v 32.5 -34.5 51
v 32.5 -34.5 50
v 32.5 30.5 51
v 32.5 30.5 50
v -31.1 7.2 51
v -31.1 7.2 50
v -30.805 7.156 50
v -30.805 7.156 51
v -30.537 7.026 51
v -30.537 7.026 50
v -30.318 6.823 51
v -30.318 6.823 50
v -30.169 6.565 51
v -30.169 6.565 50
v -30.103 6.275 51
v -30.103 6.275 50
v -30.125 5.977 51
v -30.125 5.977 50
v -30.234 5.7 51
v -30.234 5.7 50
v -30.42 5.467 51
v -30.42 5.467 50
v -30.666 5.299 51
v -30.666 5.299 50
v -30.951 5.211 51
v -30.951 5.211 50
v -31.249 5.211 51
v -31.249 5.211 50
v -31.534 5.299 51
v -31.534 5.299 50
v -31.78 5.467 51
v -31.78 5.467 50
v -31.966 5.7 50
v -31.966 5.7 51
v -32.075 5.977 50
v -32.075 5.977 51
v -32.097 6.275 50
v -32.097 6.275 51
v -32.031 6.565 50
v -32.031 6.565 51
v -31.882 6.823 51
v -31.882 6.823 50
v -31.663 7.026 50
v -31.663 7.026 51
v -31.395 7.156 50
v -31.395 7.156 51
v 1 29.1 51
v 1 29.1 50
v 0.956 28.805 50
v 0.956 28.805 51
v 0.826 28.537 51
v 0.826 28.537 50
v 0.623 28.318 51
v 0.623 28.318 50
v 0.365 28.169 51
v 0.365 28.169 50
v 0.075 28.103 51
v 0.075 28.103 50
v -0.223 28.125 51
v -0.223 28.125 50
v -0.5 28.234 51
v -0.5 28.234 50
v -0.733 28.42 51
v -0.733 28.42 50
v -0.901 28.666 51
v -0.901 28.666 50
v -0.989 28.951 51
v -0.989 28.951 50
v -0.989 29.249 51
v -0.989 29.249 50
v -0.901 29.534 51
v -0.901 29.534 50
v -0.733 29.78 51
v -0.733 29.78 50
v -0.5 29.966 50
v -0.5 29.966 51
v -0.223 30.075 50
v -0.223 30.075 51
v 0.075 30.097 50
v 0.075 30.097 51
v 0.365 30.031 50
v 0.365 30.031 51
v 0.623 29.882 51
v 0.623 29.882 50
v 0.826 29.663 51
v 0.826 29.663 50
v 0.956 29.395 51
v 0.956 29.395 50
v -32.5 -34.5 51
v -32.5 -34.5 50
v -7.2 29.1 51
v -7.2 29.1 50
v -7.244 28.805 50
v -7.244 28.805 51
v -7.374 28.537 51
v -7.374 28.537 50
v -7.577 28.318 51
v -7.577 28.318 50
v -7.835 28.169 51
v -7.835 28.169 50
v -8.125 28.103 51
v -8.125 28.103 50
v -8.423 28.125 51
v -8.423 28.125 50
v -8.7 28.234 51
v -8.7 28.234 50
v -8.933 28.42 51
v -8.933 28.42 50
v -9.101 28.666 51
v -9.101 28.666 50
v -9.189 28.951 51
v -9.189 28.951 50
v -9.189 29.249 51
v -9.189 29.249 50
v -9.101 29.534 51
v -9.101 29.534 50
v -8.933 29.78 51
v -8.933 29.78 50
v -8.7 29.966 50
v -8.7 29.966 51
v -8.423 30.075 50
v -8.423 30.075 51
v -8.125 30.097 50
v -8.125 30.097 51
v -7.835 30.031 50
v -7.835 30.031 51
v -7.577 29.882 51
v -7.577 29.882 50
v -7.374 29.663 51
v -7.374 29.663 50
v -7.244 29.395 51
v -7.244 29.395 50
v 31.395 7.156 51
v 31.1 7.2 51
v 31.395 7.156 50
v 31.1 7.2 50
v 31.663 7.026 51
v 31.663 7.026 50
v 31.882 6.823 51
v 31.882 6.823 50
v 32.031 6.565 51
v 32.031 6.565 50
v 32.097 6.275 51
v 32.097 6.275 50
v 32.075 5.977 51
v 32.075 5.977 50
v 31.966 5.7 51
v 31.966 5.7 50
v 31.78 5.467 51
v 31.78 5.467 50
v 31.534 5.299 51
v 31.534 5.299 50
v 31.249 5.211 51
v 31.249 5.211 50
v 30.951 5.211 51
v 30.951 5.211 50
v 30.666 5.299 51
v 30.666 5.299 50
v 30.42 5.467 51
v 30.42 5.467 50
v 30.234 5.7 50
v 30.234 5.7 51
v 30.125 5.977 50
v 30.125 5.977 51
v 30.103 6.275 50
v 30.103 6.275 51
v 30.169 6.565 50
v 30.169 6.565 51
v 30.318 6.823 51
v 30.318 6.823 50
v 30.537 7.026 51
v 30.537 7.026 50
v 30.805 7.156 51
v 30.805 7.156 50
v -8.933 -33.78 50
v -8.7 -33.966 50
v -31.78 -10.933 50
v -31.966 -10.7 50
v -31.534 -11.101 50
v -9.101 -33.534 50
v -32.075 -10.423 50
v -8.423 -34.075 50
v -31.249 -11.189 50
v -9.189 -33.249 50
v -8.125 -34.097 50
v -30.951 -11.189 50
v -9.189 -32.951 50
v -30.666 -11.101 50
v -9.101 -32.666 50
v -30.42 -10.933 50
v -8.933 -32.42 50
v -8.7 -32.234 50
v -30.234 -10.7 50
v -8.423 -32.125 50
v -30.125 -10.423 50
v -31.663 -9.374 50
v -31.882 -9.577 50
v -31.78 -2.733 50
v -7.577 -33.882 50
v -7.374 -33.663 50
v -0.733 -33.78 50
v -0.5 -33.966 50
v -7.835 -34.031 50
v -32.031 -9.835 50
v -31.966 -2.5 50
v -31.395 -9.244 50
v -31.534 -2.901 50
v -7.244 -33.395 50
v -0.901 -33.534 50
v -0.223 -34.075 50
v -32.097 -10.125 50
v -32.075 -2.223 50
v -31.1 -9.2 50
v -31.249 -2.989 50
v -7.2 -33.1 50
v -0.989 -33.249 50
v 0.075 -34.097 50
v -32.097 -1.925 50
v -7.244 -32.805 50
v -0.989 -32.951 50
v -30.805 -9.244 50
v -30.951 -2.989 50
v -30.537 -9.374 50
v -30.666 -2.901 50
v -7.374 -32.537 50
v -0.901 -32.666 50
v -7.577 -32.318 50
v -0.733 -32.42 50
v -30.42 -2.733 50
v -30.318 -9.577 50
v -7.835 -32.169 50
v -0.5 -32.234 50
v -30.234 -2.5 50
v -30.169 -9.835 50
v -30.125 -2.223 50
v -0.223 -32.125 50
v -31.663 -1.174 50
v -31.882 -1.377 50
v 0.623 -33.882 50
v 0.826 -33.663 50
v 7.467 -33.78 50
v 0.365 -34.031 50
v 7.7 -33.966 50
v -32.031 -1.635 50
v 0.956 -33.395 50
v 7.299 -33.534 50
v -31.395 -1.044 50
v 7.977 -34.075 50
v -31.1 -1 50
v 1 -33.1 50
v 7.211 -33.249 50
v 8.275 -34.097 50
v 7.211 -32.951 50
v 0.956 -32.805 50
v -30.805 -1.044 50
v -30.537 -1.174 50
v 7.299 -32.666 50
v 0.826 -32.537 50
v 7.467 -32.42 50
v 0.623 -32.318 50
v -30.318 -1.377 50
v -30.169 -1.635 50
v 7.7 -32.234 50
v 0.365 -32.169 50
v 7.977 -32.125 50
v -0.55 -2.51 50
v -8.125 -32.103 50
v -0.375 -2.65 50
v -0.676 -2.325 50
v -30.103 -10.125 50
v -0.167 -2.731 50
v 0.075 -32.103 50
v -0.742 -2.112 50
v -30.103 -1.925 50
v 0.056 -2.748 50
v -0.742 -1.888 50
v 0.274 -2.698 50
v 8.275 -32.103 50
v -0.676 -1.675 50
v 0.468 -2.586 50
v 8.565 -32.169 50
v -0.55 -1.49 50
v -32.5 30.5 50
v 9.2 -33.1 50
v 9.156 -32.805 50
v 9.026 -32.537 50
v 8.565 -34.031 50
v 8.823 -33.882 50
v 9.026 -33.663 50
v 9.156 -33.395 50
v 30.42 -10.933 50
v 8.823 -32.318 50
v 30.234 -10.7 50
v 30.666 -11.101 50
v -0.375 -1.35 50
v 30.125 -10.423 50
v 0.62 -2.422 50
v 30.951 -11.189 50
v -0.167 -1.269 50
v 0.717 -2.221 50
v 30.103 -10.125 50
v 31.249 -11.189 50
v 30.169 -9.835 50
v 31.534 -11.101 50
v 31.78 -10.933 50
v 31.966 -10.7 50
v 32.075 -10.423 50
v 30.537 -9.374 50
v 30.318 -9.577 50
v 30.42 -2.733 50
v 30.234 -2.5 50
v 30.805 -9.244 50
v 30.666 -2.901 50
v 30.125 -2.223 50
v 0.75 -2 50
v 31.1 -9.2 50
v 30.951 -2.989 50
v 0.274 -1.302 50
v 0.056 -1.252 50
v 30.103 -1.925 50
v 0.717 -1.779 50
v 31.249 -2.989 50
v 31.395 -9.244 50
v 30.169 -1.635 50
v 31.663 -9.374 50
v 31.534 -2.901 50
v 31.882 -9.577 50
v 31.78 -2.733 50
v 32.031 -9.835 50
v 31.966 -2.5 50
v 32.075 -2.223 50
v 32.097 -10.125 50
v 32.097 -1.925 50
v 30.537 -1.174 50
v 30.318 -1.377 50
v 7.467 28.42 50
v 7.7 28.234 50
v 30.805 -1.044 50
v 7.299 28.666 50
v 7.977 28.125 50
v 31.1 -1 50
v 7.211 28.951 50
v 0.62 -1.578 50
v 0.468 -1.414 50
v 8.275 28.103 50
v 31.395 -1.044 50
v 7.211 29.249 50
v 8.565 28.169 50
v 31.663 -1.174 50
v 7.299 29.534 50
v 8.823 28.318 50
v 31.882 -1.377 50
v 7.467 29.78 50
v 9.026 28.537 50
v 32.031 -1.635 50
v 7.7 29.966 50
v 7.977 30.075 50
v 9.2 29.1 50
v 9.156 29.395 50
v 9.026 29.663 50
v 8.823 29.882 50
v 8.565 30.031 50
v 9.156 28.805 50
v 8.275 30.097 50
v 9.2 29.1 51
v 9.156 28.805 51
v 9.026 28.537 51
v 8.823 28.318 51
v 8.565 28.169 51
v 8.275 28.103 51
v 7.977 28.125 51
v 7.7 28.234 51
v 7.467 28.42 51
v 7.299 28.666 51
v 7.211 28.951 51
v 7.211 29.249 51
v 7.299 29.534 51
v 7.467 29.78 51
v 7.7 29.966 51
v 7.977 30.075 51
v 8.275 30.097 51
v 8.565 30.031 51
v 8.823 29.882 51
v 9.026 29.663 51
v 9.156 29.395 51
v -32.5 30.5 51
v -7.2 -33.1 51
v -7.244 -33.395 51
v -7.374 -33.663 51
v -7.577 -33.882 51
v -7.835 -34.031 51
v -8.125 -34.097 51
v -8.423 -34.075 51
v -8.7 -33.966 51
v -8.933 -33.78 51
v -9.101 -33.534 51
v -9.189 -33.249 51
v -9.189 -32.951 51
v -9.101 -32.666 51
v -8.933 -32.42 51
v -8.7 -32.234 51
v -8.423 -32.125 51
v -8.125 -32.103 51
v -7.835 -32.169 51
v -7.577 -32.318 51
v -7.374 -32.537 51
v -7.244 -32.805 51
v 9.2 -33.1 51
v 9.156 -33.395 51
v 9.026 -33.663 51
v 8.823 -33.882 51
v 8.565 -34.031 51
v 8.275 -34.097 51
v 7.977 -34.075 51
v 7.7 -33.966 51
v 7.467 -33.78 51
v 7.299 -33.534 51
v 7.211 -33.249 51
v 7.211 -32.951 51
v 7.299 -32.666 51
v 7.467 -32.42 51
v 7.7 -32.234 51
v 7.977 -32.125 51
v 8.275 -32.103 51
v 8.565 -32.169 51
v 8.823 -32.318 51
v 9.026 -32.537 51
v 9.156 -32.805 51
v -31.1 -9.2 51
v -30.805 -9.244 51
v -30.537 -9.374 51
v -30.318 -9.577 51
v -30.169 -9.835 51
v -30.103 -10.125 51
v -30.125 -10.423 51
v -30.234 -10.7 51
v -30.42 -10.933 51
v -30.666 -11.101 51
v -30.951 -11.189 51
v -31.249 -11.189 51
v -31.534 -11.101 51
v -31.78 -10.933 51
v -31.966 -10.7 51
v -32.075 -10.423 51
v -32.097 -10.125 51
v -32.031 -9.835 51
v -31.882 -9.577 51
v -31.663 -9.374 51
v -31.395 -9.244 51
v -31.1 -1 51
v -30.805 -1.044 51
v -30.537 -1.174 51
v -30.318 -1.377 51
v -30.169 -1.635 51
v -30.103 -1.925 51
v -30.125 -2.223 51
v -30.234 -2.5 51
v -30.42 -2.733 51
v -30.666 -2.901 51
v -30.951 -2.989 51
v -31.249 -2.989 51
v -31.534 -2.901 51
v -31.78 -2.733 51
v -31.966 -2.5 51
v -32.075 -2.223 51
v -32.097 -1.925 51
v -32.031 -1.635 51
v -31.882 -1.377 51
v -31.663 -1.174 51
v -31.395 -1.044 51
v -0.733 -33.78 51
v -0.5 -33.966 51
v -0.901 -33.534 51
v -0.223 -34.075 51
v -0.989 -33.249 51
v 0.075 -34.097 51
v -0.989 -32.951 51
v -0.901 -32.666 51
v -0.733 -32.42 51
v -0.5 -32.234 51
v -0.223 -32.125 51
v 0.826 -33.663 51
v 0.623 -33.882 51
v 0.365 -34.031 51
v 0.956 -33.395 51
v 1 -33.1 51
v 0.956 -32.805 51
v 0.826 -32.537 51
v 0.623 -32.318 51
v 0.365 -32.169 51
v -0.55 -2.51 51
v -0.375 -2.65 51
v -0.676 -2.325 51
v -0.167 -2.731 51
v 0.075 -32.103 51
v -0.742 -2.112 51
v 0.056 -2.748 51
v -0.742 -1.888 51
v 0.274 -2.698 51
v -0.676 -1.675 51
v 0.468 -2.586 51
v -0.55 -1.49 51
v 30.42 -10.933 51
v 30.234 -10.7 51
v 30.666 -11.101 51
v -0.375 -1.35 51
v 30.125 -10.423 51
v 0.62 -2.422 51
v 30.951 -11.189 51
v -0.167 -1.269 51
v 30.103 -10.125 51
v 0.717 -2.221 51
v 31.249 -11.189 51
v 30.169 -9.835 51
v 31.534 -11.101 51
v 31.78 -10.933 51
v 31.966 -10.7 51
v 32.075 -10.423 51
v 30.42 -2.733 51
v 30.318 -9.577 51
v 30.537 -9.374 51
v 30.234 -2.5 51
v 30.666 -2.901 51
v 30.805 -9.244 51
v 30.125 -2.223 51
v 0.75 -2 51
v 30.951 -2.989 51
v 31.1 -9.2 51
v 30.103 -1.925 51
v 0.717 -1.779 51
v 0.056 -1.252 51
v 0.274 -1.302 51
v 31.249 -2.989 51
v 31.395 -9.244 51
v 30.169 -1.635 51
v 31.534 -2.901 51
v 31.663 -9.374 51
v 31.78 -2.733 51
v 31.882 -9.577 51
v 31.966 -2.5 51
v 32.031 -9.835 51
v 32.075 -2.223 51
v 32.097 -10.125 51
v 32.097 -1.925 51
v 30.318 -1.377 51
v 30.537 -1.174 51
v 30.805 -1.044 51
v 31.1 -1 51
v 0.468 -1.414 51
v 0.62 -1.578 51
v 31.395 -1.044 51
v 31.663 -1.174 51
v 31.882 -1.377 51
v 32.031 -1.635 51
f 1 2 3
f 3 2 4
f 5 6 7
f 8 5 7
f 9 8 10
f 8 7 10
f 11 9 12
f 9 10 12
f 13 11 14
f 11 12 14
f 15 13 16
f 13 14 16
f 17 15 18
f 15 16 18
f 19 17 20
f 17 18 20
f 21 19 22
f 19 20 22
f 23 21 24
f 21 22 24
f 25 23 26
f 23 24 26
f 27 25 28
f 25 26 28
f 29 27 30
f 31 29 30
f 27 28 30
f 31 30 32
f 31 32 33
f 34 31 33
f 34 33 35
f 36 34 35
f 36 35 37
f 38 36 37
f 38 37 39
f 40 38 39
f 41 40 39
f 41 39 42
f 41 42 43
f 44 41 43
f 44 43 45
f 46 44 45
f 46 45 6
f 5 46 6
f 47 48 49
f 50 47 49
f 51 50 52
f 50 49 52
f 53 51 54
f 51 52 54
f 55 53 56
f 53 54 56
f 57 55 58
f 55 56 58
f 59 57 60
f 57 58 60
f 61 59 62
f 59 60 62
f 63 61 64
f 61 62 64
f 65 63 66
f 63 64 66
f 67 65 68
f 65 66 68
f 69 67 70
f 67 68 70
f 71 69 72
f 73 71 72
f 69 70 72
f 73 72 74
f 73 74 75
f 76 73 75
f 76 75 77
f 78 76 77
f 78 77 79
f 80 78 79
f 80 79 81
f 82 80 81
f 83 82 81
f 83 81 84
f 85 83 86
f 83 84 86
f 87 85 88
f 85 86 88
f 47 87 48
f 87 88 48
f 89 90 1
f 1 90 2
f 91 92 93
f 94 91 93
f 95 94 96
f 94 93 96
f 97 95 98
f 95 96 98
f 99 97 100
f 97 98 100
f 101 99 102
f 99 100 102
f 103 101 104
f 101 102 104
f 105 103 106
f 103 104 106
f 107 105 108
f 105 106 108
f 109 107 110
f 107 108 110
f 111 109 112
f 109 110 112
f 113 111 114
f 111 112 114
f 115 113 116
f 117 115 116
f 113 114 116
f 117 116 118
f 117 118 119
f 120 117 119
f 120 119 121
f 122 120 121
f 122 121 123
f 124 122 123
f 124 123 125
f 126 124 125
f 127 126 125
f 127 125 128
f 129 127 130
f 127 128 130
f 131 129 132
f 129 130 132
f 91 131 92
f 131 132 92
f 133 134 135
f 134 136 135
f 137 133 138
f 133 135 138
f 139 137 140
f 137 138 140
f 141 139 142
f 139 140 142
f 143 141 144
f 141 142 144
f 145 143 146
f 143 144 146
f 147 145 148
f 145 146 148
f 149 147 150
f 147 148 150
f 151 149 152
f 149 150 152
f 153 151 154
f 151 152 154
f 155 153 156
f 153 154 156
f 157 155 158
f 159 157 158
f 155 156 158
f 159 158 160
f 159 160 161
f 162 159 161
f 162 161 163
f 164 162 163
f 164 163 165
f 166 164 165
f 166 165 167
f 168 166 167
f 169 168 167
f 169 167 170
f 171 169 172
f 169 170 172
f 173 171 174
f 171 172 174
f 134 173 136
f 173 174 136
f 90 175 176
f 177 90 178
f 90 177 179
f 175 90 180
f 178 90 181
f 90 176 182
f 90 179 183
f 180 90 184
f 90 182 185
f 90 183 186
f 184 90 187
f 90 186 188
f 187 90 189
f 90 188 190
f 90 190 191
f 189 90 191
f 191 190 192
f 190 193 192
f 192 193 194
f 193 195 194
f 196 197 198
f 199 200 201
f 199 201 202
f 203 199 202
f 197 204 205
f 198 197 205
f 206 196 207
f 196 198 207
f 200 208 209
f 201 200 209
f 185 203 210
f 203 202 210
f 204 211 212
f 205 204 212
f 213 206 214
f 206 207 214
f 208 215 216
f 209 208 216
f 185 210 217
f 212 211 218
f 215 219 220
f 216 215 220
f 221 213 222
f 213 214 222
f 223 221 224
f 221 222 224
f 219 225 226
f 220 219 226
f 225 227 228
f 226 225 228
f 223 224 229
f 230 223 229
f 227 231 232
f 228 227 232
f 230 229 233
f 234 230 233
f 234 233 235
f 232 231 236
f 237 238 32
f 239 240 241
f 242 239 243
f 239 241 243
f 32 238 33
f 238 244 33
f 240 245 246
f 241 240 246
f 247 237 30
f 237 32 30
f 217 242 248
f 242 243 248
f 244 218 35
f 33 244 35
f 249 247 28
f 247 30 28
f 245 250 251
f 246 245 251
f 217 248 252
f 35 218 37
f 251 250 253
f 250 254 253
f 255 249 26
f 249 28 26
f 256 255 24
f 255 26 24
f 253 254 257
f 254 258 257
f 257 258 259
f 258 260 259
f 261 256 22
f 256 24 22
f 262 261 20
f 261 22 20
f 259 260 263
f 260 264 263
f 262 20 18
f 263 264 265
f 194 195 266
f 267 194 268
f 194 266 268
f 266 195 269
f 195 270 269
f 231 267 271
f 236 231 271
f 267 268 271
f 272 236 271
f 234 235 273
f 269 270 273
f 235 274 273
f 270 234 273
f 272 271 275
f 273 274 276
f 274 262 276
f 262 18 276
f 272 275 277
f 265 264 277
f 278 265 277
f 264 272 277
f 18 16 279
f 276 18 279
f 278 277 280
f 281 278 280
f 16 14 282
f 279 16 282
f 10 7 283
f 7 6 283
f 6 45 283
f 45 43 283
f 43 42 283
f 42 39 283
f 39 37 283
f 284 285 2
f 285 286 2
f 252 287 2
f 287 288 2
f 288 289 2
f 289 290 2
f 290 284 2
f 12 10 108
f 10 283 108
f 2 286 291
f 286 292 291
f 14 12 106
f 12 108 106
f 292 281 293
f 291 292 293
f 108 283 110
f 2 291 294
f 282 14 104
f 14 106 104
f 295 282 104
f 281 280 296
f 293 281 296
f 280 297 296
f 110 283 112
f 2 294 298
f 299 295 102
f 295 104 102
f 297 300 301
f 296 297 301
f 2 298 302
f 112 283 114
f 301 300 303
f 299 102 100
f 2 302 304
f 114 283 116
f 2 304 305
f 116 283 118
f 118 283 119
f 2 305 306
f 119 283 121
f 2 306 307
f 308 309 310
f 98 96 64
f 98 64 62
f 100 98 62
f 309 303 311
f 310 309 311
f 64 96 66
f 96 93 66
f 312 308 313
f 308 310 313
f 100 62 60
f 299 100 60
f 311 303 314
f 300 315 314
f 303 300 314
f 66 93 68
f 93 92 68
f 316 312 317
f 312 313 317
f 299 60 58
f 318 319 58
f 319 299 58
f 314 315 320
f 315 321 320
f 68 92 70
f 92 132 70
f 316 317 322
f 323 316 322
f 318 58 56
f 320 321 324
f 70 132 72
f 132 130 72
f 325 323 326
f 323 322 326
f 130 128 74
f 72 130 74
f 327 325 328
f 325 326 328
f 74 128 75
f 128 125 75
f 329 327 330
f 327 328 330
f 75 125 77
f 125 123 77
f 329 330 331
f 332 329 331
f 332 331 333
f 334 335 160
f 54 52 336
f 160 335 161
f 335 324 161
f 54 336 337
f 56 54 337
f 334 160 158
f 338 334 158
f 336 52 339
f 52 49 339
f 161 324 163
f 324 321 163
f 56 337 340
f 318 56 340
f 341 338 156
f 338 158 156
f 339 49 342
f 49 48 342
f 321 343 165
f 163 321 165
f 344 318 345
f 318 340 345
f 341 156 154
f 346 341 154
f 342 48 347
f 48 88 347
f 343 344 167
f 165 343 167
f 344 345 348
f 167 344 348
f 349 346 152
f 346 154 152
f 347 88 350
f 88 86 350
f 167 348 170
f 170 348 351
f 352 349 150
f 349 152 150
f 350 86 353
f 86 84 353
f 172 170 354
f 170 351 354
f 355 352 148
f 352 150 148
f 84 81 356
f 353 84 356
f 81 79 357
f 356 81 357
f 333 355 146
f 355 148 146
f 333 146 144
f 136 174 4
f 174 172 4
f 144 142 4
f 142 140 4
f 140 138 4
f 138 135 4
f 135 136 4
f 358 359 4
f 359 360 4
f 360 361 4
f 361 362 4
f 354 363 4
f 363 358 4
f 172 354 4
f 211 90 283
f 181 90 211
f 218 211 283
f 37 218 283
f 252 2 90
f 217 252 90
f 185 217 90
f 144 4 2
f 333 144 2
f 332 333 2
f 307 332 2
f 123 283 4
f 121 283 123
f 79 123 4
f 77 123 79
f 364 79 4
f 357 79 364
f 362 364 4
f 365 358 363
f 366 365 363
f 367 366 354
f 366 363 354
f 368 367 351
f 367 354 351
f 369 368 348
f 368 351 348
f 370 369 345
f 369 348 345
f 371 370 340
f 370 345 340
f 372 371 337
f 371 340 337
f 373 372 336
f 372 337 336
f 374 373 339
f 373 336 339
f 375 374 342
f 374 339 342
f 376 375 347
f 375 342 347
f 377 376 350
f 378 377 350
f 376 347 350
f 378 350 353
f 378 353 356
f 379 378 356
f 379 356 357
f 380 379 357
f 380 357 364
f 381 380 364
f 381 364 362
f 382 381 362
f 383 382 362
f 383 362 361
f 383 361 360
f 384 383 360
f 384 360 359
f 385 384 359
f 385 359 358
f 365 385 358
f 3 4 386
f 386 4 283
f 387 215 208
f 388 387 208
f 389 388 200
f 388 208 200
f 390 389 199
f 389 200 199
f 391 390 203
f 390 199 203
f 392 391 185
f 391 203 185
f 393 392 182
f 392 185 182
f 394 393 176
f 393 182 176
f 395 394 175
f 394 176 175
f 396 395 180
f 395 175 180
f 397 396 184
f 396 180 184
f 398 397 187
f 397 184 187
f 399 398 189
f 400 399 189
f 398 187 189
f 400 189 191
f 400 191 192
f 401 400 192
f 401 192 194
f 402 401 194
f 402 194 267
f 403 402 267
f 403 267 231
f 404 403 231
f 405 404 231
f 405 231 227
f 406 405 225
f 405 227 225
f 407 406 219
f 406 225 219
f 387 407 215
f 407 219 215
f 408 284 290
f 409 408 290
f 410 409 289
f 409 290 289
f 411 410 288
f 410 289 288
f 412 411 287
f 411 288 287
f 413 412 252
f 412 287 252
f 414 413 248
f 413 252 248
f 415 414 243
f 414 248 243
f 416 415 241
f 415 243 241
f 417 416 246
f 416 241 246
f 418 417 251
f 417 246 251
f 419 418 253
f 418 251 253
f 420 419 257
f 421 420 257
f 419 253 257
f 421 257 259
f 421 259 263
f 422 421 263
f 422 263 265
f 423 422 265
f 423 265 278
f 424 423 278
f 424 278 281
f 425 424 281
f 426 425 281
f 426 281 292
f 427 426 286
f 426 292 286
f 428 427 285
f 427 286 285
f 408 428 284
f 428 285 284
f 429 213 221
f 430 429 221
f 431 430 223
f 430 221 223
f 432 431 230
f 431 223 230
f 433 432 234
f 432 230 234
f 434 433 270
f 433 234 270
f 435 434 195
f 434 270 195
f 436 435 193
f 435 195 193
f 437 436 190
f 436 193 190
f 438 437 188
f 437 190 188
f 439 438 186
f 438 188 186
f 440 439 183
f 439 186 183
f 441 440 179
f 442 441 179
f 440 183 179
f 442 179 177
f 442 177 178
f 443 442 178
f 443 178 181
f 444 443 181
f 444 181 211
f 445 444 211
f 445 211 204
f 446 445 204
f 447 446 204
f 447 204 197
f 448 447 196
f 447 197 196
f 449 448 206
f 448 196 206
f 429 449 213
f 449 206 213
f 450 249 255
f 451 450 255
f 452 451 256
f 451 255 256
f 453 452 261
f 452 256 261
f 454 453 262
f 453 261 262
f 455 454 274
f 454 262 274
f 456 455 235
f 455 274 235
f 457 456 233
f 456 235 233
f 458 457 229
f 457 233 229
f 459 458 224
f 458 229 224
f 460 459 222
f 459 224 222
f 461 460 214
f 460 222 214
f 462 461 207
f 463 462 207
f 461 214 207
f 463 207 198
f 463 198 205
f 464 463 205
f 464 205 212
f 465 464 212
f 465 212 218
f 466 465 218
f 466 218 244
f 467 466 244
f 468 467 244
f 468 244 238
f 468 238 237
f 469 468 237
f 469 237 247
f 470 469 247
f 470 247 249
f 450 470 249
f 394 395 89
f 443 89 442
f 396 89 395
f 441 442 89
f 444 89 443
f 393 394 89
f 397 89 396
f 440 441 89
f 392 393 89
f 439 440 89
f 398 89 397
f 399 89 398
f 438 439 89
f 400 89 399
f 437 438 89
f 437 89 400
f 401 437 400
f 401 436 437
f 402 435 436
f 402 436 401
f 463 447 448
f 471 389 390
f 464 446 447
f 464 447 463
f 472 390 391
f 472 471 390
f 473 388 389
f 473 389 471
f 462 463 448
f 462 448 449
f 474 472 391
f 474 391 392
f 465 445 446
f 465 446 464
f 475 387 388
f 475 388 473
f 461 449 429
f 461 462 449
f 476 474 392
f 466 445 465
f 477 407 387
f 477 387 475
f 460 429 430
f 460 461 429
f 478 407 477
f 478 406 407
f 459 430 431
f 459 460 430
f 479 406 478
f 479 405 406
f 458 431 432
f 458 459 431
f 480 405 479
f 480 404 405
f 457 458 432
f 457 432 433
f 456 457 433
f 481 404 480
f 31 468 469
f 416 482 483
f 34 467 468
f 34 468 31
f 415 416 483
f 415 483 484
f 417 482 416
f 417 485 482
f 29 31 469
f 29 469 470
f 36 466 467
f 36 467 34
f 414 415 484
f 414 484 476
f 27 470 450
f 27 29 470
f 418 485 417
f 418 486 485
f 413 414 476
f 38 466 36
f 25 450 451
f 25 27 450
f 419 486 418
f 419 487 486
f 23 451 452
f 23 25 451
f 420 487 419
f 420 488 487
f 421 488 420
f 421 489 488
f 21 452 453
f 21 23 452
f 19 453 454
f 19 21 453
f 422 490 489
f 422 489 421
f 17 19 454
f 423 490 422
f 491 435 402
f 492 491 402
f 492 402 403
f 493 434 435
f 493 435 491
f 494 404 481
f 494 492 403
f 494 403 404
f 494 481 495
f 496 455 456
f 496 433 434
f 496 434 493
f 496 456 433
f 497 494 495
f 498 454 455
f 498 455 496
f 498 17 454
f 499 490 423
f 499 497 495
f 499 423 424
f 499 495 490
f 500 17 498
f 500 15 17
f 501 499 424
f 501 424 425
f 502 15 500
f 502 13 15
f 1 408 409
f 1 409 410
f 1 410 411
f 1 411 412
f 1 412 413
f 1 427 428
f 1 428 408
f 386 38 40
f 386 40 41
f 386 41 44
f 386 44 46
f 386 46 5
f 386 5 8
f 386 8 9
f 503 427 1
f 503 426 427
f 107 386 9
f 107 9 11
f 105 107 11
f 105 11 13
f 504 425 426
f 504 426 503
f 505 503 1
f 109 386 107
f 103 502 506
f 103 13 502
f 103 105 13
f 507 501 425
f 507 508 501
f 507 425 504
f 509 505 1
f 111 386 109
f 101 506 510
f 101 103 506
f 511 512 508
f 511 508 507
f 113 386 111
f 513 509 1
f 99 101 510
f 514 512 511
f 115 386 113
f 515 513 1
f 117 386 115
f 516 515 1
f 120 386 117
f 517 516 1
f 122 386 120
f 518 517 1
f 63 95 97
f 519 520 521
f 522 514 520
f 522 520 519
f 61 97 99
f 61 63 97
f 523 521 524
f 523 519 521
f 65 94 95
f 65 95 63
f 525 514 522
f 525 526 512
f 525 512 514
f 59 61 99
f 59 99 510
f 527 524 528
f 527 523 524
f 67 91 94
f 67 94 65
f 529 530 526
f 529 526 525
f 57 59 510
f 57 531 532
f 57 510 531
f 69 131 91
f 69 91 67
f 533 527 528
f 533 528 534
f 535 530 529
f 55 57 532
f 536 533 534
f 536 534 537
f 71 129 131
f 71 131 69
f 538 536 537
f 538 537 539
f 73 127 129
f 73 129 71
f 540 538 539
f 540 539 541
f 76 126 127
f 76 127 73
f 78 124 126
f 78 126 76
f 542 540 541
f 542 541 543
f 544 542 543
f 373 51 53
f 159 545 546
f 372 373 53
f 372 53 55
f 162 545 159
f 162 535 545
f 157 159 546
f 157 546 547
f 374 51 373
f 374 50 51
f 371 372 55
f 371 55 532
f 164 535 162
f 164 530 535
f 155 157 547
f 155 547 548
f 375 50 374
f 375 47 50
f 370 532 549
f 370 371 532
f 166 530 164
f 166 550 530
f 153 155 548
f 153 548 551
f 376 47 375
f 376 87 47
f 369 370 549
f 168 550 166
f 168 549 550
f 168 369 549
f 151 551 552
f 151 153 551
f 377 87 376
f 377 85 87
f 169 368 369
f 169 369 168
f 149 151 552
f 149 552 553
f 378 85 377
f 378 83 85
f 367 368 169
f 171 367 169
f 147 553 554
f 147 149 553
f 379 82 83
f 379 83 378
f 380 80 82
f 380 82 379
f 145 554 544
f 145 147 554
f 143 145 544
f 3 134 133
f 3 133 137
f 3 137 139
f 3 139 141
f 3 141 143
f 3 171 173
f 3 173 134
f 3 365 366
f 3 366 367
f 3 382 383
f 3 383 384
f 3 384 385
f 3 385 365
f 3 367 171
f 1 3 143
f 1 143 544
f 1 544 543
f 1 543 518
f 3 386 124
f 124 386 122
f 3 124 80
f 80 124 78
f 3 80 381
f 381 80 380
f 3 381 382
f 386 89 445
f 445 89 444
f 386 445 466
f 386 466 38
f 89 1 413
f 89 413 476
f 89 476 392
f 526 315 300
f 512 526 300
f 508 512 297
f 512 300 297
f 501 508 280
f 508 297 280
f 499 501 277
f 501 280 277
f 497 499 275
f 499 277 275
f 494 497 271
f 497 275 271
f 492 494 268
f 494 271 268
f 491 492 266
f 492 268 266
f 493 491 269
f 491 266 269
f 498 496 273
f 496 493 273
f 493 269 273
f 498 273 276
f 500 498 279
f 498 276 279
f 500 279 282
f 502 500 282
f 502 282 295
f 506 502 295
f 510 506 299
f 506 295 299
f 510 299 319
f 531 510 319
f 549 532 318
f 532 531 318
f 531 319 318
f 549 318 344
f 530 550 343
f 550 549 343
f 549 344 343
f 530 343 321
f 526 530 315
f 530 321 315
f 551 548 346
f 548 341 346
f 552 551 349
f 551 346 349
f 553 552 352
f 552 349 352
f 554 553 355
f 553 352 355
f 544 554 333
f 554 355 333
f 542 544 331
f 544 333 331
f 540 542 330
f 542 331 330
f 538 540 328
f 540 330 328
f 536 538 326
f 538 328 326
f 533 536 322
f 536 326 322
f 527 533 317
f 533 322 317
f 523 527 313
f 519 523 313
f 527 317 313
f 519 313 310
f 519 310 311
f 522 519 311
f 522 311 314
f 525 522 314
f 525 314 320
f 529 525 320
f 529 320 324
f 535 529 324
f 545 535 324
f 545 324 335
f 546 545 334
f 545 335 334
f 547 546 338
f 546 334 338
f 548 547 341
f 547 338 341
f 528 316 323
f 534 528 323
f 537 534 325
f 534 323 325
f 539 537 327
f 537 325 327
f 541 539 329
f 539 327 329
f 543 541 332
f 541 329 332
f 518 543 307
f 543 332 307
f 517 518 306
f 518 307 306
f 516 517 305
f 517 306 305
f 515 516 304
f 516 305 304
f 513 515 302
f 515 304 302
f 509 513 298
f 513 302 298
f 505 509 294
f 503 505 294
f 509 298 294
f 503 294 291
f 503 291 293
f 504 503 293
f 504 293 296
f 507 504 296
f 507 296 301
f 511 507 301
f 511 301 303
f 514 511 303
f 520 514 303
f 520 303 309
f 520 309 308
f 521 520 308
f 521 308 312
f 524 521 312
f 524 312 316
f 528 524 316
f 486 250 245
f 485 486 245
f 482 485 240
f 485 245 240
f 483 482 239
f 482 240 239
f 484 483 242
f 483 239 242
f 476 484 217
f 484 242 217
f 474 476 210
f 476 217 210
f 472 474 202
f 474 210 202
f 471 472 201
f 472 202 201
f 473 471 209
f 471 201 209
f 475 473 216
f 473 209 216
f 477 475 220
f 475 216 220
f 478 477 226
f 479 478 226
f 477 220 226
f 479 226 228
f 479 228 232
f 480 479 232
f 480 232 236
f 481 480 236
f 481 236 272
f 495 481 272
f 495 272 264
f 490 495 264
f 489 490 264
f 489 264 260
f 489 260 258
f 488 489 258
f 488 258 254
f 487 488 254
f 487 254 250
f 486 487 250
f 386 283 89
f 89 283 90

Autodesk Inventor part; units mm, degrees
ref_plane "YZ Plane" through (0, 0, 0) normal (1, 0, 0) x (0, 1, 0)
ref_plane "XZ Plane" through (0, 0, 0) normal (0, 1, 0) x (-1, 0, 0)
ref_plane "XY Plane" through (0, 0, 0) normal (0, 0, 1) x (1, 0, 0)
ref_plane "Arbeitsebene1" through (0, 0, 50) normal (0, 0, 1) x (1, 0, 0)
sketch "Skizze1" plane through (0, 0, 50) normal (0, 0, 1) x (1, 0, 0)
  circle A0 centre (0, -2) radius 0.75 projected
  line L0 (32.5, 30.5) -> (-32.5, 30.5)
  line L1 (-32.5, 30.5) -> (-32.5, -34.5)
  line L2 (-32.5, -34.5) -> (32.5, -34.5)
  line L3 (32.5, -34.5) -> (32.5, 30.5)
  line L4 (32.5, 30.5) -> (-32.5, -34.5) construction
  line L5 (-32.5, 30.5) -> (32.5, -34.5) construction
  point P0 (0, 0)
  dimension "d0" = 65
  dimension "d1" = 65
extrude "Extrusion1" add sketch "Skizze1" along normal blind 1
sketch "Skizze2" plane through (0, 0, 50) normal (0, 0, 1) x (1, 0, 0)
  circle A0 centre (0, -2) radius 0.75 projected
  line L0 (32.5, 30.5) -> (-32.5, 30.5) projected
  line L1 (-32.5, 30.5) -> (-32.5, -34.5) projected
  line L2 (-32.5, -34.5) -> (32.5, -34.5) projected
  line L3 (32.5, -34.5) -> (32.5, 30.5) projected
  circle A1 centre (0, -33.1) radius 1
  circle A2 centre (0, 29.1) radius 1
  circle A3 centre (8.2, -33.1) radius 1
  circle A4 centre (-8.2, -33.1) radius 1
  circle A5 centre (-8.2, 29.1) radius 1
  circle A6 centre (8.2, 29.1) radius 1
  point P0 (0, 0)
  point P1 (3.8, 10.2517)
  dimension "d4" = 2
  dimension "d5" = 2
  dimension "d6" = 1.4
  dimension "d7" = 1.4
  dimension "d8" = 2
  dimension "d9" = 2
  dimension "d10" = 2
  dimension "d11" = 2
extrude "Extrusion2" cut sketch "Skizze2" along normal blind 1 contours A1 | A2 | A3 | A4 | A5 | A6
pattern_circular "Runde Anordnung1" count 4 over 360 about axis through (0, -2, 50) along (0, 0, 1) of "Extrusion2"
properties part number "00_LED-ARRAY"
